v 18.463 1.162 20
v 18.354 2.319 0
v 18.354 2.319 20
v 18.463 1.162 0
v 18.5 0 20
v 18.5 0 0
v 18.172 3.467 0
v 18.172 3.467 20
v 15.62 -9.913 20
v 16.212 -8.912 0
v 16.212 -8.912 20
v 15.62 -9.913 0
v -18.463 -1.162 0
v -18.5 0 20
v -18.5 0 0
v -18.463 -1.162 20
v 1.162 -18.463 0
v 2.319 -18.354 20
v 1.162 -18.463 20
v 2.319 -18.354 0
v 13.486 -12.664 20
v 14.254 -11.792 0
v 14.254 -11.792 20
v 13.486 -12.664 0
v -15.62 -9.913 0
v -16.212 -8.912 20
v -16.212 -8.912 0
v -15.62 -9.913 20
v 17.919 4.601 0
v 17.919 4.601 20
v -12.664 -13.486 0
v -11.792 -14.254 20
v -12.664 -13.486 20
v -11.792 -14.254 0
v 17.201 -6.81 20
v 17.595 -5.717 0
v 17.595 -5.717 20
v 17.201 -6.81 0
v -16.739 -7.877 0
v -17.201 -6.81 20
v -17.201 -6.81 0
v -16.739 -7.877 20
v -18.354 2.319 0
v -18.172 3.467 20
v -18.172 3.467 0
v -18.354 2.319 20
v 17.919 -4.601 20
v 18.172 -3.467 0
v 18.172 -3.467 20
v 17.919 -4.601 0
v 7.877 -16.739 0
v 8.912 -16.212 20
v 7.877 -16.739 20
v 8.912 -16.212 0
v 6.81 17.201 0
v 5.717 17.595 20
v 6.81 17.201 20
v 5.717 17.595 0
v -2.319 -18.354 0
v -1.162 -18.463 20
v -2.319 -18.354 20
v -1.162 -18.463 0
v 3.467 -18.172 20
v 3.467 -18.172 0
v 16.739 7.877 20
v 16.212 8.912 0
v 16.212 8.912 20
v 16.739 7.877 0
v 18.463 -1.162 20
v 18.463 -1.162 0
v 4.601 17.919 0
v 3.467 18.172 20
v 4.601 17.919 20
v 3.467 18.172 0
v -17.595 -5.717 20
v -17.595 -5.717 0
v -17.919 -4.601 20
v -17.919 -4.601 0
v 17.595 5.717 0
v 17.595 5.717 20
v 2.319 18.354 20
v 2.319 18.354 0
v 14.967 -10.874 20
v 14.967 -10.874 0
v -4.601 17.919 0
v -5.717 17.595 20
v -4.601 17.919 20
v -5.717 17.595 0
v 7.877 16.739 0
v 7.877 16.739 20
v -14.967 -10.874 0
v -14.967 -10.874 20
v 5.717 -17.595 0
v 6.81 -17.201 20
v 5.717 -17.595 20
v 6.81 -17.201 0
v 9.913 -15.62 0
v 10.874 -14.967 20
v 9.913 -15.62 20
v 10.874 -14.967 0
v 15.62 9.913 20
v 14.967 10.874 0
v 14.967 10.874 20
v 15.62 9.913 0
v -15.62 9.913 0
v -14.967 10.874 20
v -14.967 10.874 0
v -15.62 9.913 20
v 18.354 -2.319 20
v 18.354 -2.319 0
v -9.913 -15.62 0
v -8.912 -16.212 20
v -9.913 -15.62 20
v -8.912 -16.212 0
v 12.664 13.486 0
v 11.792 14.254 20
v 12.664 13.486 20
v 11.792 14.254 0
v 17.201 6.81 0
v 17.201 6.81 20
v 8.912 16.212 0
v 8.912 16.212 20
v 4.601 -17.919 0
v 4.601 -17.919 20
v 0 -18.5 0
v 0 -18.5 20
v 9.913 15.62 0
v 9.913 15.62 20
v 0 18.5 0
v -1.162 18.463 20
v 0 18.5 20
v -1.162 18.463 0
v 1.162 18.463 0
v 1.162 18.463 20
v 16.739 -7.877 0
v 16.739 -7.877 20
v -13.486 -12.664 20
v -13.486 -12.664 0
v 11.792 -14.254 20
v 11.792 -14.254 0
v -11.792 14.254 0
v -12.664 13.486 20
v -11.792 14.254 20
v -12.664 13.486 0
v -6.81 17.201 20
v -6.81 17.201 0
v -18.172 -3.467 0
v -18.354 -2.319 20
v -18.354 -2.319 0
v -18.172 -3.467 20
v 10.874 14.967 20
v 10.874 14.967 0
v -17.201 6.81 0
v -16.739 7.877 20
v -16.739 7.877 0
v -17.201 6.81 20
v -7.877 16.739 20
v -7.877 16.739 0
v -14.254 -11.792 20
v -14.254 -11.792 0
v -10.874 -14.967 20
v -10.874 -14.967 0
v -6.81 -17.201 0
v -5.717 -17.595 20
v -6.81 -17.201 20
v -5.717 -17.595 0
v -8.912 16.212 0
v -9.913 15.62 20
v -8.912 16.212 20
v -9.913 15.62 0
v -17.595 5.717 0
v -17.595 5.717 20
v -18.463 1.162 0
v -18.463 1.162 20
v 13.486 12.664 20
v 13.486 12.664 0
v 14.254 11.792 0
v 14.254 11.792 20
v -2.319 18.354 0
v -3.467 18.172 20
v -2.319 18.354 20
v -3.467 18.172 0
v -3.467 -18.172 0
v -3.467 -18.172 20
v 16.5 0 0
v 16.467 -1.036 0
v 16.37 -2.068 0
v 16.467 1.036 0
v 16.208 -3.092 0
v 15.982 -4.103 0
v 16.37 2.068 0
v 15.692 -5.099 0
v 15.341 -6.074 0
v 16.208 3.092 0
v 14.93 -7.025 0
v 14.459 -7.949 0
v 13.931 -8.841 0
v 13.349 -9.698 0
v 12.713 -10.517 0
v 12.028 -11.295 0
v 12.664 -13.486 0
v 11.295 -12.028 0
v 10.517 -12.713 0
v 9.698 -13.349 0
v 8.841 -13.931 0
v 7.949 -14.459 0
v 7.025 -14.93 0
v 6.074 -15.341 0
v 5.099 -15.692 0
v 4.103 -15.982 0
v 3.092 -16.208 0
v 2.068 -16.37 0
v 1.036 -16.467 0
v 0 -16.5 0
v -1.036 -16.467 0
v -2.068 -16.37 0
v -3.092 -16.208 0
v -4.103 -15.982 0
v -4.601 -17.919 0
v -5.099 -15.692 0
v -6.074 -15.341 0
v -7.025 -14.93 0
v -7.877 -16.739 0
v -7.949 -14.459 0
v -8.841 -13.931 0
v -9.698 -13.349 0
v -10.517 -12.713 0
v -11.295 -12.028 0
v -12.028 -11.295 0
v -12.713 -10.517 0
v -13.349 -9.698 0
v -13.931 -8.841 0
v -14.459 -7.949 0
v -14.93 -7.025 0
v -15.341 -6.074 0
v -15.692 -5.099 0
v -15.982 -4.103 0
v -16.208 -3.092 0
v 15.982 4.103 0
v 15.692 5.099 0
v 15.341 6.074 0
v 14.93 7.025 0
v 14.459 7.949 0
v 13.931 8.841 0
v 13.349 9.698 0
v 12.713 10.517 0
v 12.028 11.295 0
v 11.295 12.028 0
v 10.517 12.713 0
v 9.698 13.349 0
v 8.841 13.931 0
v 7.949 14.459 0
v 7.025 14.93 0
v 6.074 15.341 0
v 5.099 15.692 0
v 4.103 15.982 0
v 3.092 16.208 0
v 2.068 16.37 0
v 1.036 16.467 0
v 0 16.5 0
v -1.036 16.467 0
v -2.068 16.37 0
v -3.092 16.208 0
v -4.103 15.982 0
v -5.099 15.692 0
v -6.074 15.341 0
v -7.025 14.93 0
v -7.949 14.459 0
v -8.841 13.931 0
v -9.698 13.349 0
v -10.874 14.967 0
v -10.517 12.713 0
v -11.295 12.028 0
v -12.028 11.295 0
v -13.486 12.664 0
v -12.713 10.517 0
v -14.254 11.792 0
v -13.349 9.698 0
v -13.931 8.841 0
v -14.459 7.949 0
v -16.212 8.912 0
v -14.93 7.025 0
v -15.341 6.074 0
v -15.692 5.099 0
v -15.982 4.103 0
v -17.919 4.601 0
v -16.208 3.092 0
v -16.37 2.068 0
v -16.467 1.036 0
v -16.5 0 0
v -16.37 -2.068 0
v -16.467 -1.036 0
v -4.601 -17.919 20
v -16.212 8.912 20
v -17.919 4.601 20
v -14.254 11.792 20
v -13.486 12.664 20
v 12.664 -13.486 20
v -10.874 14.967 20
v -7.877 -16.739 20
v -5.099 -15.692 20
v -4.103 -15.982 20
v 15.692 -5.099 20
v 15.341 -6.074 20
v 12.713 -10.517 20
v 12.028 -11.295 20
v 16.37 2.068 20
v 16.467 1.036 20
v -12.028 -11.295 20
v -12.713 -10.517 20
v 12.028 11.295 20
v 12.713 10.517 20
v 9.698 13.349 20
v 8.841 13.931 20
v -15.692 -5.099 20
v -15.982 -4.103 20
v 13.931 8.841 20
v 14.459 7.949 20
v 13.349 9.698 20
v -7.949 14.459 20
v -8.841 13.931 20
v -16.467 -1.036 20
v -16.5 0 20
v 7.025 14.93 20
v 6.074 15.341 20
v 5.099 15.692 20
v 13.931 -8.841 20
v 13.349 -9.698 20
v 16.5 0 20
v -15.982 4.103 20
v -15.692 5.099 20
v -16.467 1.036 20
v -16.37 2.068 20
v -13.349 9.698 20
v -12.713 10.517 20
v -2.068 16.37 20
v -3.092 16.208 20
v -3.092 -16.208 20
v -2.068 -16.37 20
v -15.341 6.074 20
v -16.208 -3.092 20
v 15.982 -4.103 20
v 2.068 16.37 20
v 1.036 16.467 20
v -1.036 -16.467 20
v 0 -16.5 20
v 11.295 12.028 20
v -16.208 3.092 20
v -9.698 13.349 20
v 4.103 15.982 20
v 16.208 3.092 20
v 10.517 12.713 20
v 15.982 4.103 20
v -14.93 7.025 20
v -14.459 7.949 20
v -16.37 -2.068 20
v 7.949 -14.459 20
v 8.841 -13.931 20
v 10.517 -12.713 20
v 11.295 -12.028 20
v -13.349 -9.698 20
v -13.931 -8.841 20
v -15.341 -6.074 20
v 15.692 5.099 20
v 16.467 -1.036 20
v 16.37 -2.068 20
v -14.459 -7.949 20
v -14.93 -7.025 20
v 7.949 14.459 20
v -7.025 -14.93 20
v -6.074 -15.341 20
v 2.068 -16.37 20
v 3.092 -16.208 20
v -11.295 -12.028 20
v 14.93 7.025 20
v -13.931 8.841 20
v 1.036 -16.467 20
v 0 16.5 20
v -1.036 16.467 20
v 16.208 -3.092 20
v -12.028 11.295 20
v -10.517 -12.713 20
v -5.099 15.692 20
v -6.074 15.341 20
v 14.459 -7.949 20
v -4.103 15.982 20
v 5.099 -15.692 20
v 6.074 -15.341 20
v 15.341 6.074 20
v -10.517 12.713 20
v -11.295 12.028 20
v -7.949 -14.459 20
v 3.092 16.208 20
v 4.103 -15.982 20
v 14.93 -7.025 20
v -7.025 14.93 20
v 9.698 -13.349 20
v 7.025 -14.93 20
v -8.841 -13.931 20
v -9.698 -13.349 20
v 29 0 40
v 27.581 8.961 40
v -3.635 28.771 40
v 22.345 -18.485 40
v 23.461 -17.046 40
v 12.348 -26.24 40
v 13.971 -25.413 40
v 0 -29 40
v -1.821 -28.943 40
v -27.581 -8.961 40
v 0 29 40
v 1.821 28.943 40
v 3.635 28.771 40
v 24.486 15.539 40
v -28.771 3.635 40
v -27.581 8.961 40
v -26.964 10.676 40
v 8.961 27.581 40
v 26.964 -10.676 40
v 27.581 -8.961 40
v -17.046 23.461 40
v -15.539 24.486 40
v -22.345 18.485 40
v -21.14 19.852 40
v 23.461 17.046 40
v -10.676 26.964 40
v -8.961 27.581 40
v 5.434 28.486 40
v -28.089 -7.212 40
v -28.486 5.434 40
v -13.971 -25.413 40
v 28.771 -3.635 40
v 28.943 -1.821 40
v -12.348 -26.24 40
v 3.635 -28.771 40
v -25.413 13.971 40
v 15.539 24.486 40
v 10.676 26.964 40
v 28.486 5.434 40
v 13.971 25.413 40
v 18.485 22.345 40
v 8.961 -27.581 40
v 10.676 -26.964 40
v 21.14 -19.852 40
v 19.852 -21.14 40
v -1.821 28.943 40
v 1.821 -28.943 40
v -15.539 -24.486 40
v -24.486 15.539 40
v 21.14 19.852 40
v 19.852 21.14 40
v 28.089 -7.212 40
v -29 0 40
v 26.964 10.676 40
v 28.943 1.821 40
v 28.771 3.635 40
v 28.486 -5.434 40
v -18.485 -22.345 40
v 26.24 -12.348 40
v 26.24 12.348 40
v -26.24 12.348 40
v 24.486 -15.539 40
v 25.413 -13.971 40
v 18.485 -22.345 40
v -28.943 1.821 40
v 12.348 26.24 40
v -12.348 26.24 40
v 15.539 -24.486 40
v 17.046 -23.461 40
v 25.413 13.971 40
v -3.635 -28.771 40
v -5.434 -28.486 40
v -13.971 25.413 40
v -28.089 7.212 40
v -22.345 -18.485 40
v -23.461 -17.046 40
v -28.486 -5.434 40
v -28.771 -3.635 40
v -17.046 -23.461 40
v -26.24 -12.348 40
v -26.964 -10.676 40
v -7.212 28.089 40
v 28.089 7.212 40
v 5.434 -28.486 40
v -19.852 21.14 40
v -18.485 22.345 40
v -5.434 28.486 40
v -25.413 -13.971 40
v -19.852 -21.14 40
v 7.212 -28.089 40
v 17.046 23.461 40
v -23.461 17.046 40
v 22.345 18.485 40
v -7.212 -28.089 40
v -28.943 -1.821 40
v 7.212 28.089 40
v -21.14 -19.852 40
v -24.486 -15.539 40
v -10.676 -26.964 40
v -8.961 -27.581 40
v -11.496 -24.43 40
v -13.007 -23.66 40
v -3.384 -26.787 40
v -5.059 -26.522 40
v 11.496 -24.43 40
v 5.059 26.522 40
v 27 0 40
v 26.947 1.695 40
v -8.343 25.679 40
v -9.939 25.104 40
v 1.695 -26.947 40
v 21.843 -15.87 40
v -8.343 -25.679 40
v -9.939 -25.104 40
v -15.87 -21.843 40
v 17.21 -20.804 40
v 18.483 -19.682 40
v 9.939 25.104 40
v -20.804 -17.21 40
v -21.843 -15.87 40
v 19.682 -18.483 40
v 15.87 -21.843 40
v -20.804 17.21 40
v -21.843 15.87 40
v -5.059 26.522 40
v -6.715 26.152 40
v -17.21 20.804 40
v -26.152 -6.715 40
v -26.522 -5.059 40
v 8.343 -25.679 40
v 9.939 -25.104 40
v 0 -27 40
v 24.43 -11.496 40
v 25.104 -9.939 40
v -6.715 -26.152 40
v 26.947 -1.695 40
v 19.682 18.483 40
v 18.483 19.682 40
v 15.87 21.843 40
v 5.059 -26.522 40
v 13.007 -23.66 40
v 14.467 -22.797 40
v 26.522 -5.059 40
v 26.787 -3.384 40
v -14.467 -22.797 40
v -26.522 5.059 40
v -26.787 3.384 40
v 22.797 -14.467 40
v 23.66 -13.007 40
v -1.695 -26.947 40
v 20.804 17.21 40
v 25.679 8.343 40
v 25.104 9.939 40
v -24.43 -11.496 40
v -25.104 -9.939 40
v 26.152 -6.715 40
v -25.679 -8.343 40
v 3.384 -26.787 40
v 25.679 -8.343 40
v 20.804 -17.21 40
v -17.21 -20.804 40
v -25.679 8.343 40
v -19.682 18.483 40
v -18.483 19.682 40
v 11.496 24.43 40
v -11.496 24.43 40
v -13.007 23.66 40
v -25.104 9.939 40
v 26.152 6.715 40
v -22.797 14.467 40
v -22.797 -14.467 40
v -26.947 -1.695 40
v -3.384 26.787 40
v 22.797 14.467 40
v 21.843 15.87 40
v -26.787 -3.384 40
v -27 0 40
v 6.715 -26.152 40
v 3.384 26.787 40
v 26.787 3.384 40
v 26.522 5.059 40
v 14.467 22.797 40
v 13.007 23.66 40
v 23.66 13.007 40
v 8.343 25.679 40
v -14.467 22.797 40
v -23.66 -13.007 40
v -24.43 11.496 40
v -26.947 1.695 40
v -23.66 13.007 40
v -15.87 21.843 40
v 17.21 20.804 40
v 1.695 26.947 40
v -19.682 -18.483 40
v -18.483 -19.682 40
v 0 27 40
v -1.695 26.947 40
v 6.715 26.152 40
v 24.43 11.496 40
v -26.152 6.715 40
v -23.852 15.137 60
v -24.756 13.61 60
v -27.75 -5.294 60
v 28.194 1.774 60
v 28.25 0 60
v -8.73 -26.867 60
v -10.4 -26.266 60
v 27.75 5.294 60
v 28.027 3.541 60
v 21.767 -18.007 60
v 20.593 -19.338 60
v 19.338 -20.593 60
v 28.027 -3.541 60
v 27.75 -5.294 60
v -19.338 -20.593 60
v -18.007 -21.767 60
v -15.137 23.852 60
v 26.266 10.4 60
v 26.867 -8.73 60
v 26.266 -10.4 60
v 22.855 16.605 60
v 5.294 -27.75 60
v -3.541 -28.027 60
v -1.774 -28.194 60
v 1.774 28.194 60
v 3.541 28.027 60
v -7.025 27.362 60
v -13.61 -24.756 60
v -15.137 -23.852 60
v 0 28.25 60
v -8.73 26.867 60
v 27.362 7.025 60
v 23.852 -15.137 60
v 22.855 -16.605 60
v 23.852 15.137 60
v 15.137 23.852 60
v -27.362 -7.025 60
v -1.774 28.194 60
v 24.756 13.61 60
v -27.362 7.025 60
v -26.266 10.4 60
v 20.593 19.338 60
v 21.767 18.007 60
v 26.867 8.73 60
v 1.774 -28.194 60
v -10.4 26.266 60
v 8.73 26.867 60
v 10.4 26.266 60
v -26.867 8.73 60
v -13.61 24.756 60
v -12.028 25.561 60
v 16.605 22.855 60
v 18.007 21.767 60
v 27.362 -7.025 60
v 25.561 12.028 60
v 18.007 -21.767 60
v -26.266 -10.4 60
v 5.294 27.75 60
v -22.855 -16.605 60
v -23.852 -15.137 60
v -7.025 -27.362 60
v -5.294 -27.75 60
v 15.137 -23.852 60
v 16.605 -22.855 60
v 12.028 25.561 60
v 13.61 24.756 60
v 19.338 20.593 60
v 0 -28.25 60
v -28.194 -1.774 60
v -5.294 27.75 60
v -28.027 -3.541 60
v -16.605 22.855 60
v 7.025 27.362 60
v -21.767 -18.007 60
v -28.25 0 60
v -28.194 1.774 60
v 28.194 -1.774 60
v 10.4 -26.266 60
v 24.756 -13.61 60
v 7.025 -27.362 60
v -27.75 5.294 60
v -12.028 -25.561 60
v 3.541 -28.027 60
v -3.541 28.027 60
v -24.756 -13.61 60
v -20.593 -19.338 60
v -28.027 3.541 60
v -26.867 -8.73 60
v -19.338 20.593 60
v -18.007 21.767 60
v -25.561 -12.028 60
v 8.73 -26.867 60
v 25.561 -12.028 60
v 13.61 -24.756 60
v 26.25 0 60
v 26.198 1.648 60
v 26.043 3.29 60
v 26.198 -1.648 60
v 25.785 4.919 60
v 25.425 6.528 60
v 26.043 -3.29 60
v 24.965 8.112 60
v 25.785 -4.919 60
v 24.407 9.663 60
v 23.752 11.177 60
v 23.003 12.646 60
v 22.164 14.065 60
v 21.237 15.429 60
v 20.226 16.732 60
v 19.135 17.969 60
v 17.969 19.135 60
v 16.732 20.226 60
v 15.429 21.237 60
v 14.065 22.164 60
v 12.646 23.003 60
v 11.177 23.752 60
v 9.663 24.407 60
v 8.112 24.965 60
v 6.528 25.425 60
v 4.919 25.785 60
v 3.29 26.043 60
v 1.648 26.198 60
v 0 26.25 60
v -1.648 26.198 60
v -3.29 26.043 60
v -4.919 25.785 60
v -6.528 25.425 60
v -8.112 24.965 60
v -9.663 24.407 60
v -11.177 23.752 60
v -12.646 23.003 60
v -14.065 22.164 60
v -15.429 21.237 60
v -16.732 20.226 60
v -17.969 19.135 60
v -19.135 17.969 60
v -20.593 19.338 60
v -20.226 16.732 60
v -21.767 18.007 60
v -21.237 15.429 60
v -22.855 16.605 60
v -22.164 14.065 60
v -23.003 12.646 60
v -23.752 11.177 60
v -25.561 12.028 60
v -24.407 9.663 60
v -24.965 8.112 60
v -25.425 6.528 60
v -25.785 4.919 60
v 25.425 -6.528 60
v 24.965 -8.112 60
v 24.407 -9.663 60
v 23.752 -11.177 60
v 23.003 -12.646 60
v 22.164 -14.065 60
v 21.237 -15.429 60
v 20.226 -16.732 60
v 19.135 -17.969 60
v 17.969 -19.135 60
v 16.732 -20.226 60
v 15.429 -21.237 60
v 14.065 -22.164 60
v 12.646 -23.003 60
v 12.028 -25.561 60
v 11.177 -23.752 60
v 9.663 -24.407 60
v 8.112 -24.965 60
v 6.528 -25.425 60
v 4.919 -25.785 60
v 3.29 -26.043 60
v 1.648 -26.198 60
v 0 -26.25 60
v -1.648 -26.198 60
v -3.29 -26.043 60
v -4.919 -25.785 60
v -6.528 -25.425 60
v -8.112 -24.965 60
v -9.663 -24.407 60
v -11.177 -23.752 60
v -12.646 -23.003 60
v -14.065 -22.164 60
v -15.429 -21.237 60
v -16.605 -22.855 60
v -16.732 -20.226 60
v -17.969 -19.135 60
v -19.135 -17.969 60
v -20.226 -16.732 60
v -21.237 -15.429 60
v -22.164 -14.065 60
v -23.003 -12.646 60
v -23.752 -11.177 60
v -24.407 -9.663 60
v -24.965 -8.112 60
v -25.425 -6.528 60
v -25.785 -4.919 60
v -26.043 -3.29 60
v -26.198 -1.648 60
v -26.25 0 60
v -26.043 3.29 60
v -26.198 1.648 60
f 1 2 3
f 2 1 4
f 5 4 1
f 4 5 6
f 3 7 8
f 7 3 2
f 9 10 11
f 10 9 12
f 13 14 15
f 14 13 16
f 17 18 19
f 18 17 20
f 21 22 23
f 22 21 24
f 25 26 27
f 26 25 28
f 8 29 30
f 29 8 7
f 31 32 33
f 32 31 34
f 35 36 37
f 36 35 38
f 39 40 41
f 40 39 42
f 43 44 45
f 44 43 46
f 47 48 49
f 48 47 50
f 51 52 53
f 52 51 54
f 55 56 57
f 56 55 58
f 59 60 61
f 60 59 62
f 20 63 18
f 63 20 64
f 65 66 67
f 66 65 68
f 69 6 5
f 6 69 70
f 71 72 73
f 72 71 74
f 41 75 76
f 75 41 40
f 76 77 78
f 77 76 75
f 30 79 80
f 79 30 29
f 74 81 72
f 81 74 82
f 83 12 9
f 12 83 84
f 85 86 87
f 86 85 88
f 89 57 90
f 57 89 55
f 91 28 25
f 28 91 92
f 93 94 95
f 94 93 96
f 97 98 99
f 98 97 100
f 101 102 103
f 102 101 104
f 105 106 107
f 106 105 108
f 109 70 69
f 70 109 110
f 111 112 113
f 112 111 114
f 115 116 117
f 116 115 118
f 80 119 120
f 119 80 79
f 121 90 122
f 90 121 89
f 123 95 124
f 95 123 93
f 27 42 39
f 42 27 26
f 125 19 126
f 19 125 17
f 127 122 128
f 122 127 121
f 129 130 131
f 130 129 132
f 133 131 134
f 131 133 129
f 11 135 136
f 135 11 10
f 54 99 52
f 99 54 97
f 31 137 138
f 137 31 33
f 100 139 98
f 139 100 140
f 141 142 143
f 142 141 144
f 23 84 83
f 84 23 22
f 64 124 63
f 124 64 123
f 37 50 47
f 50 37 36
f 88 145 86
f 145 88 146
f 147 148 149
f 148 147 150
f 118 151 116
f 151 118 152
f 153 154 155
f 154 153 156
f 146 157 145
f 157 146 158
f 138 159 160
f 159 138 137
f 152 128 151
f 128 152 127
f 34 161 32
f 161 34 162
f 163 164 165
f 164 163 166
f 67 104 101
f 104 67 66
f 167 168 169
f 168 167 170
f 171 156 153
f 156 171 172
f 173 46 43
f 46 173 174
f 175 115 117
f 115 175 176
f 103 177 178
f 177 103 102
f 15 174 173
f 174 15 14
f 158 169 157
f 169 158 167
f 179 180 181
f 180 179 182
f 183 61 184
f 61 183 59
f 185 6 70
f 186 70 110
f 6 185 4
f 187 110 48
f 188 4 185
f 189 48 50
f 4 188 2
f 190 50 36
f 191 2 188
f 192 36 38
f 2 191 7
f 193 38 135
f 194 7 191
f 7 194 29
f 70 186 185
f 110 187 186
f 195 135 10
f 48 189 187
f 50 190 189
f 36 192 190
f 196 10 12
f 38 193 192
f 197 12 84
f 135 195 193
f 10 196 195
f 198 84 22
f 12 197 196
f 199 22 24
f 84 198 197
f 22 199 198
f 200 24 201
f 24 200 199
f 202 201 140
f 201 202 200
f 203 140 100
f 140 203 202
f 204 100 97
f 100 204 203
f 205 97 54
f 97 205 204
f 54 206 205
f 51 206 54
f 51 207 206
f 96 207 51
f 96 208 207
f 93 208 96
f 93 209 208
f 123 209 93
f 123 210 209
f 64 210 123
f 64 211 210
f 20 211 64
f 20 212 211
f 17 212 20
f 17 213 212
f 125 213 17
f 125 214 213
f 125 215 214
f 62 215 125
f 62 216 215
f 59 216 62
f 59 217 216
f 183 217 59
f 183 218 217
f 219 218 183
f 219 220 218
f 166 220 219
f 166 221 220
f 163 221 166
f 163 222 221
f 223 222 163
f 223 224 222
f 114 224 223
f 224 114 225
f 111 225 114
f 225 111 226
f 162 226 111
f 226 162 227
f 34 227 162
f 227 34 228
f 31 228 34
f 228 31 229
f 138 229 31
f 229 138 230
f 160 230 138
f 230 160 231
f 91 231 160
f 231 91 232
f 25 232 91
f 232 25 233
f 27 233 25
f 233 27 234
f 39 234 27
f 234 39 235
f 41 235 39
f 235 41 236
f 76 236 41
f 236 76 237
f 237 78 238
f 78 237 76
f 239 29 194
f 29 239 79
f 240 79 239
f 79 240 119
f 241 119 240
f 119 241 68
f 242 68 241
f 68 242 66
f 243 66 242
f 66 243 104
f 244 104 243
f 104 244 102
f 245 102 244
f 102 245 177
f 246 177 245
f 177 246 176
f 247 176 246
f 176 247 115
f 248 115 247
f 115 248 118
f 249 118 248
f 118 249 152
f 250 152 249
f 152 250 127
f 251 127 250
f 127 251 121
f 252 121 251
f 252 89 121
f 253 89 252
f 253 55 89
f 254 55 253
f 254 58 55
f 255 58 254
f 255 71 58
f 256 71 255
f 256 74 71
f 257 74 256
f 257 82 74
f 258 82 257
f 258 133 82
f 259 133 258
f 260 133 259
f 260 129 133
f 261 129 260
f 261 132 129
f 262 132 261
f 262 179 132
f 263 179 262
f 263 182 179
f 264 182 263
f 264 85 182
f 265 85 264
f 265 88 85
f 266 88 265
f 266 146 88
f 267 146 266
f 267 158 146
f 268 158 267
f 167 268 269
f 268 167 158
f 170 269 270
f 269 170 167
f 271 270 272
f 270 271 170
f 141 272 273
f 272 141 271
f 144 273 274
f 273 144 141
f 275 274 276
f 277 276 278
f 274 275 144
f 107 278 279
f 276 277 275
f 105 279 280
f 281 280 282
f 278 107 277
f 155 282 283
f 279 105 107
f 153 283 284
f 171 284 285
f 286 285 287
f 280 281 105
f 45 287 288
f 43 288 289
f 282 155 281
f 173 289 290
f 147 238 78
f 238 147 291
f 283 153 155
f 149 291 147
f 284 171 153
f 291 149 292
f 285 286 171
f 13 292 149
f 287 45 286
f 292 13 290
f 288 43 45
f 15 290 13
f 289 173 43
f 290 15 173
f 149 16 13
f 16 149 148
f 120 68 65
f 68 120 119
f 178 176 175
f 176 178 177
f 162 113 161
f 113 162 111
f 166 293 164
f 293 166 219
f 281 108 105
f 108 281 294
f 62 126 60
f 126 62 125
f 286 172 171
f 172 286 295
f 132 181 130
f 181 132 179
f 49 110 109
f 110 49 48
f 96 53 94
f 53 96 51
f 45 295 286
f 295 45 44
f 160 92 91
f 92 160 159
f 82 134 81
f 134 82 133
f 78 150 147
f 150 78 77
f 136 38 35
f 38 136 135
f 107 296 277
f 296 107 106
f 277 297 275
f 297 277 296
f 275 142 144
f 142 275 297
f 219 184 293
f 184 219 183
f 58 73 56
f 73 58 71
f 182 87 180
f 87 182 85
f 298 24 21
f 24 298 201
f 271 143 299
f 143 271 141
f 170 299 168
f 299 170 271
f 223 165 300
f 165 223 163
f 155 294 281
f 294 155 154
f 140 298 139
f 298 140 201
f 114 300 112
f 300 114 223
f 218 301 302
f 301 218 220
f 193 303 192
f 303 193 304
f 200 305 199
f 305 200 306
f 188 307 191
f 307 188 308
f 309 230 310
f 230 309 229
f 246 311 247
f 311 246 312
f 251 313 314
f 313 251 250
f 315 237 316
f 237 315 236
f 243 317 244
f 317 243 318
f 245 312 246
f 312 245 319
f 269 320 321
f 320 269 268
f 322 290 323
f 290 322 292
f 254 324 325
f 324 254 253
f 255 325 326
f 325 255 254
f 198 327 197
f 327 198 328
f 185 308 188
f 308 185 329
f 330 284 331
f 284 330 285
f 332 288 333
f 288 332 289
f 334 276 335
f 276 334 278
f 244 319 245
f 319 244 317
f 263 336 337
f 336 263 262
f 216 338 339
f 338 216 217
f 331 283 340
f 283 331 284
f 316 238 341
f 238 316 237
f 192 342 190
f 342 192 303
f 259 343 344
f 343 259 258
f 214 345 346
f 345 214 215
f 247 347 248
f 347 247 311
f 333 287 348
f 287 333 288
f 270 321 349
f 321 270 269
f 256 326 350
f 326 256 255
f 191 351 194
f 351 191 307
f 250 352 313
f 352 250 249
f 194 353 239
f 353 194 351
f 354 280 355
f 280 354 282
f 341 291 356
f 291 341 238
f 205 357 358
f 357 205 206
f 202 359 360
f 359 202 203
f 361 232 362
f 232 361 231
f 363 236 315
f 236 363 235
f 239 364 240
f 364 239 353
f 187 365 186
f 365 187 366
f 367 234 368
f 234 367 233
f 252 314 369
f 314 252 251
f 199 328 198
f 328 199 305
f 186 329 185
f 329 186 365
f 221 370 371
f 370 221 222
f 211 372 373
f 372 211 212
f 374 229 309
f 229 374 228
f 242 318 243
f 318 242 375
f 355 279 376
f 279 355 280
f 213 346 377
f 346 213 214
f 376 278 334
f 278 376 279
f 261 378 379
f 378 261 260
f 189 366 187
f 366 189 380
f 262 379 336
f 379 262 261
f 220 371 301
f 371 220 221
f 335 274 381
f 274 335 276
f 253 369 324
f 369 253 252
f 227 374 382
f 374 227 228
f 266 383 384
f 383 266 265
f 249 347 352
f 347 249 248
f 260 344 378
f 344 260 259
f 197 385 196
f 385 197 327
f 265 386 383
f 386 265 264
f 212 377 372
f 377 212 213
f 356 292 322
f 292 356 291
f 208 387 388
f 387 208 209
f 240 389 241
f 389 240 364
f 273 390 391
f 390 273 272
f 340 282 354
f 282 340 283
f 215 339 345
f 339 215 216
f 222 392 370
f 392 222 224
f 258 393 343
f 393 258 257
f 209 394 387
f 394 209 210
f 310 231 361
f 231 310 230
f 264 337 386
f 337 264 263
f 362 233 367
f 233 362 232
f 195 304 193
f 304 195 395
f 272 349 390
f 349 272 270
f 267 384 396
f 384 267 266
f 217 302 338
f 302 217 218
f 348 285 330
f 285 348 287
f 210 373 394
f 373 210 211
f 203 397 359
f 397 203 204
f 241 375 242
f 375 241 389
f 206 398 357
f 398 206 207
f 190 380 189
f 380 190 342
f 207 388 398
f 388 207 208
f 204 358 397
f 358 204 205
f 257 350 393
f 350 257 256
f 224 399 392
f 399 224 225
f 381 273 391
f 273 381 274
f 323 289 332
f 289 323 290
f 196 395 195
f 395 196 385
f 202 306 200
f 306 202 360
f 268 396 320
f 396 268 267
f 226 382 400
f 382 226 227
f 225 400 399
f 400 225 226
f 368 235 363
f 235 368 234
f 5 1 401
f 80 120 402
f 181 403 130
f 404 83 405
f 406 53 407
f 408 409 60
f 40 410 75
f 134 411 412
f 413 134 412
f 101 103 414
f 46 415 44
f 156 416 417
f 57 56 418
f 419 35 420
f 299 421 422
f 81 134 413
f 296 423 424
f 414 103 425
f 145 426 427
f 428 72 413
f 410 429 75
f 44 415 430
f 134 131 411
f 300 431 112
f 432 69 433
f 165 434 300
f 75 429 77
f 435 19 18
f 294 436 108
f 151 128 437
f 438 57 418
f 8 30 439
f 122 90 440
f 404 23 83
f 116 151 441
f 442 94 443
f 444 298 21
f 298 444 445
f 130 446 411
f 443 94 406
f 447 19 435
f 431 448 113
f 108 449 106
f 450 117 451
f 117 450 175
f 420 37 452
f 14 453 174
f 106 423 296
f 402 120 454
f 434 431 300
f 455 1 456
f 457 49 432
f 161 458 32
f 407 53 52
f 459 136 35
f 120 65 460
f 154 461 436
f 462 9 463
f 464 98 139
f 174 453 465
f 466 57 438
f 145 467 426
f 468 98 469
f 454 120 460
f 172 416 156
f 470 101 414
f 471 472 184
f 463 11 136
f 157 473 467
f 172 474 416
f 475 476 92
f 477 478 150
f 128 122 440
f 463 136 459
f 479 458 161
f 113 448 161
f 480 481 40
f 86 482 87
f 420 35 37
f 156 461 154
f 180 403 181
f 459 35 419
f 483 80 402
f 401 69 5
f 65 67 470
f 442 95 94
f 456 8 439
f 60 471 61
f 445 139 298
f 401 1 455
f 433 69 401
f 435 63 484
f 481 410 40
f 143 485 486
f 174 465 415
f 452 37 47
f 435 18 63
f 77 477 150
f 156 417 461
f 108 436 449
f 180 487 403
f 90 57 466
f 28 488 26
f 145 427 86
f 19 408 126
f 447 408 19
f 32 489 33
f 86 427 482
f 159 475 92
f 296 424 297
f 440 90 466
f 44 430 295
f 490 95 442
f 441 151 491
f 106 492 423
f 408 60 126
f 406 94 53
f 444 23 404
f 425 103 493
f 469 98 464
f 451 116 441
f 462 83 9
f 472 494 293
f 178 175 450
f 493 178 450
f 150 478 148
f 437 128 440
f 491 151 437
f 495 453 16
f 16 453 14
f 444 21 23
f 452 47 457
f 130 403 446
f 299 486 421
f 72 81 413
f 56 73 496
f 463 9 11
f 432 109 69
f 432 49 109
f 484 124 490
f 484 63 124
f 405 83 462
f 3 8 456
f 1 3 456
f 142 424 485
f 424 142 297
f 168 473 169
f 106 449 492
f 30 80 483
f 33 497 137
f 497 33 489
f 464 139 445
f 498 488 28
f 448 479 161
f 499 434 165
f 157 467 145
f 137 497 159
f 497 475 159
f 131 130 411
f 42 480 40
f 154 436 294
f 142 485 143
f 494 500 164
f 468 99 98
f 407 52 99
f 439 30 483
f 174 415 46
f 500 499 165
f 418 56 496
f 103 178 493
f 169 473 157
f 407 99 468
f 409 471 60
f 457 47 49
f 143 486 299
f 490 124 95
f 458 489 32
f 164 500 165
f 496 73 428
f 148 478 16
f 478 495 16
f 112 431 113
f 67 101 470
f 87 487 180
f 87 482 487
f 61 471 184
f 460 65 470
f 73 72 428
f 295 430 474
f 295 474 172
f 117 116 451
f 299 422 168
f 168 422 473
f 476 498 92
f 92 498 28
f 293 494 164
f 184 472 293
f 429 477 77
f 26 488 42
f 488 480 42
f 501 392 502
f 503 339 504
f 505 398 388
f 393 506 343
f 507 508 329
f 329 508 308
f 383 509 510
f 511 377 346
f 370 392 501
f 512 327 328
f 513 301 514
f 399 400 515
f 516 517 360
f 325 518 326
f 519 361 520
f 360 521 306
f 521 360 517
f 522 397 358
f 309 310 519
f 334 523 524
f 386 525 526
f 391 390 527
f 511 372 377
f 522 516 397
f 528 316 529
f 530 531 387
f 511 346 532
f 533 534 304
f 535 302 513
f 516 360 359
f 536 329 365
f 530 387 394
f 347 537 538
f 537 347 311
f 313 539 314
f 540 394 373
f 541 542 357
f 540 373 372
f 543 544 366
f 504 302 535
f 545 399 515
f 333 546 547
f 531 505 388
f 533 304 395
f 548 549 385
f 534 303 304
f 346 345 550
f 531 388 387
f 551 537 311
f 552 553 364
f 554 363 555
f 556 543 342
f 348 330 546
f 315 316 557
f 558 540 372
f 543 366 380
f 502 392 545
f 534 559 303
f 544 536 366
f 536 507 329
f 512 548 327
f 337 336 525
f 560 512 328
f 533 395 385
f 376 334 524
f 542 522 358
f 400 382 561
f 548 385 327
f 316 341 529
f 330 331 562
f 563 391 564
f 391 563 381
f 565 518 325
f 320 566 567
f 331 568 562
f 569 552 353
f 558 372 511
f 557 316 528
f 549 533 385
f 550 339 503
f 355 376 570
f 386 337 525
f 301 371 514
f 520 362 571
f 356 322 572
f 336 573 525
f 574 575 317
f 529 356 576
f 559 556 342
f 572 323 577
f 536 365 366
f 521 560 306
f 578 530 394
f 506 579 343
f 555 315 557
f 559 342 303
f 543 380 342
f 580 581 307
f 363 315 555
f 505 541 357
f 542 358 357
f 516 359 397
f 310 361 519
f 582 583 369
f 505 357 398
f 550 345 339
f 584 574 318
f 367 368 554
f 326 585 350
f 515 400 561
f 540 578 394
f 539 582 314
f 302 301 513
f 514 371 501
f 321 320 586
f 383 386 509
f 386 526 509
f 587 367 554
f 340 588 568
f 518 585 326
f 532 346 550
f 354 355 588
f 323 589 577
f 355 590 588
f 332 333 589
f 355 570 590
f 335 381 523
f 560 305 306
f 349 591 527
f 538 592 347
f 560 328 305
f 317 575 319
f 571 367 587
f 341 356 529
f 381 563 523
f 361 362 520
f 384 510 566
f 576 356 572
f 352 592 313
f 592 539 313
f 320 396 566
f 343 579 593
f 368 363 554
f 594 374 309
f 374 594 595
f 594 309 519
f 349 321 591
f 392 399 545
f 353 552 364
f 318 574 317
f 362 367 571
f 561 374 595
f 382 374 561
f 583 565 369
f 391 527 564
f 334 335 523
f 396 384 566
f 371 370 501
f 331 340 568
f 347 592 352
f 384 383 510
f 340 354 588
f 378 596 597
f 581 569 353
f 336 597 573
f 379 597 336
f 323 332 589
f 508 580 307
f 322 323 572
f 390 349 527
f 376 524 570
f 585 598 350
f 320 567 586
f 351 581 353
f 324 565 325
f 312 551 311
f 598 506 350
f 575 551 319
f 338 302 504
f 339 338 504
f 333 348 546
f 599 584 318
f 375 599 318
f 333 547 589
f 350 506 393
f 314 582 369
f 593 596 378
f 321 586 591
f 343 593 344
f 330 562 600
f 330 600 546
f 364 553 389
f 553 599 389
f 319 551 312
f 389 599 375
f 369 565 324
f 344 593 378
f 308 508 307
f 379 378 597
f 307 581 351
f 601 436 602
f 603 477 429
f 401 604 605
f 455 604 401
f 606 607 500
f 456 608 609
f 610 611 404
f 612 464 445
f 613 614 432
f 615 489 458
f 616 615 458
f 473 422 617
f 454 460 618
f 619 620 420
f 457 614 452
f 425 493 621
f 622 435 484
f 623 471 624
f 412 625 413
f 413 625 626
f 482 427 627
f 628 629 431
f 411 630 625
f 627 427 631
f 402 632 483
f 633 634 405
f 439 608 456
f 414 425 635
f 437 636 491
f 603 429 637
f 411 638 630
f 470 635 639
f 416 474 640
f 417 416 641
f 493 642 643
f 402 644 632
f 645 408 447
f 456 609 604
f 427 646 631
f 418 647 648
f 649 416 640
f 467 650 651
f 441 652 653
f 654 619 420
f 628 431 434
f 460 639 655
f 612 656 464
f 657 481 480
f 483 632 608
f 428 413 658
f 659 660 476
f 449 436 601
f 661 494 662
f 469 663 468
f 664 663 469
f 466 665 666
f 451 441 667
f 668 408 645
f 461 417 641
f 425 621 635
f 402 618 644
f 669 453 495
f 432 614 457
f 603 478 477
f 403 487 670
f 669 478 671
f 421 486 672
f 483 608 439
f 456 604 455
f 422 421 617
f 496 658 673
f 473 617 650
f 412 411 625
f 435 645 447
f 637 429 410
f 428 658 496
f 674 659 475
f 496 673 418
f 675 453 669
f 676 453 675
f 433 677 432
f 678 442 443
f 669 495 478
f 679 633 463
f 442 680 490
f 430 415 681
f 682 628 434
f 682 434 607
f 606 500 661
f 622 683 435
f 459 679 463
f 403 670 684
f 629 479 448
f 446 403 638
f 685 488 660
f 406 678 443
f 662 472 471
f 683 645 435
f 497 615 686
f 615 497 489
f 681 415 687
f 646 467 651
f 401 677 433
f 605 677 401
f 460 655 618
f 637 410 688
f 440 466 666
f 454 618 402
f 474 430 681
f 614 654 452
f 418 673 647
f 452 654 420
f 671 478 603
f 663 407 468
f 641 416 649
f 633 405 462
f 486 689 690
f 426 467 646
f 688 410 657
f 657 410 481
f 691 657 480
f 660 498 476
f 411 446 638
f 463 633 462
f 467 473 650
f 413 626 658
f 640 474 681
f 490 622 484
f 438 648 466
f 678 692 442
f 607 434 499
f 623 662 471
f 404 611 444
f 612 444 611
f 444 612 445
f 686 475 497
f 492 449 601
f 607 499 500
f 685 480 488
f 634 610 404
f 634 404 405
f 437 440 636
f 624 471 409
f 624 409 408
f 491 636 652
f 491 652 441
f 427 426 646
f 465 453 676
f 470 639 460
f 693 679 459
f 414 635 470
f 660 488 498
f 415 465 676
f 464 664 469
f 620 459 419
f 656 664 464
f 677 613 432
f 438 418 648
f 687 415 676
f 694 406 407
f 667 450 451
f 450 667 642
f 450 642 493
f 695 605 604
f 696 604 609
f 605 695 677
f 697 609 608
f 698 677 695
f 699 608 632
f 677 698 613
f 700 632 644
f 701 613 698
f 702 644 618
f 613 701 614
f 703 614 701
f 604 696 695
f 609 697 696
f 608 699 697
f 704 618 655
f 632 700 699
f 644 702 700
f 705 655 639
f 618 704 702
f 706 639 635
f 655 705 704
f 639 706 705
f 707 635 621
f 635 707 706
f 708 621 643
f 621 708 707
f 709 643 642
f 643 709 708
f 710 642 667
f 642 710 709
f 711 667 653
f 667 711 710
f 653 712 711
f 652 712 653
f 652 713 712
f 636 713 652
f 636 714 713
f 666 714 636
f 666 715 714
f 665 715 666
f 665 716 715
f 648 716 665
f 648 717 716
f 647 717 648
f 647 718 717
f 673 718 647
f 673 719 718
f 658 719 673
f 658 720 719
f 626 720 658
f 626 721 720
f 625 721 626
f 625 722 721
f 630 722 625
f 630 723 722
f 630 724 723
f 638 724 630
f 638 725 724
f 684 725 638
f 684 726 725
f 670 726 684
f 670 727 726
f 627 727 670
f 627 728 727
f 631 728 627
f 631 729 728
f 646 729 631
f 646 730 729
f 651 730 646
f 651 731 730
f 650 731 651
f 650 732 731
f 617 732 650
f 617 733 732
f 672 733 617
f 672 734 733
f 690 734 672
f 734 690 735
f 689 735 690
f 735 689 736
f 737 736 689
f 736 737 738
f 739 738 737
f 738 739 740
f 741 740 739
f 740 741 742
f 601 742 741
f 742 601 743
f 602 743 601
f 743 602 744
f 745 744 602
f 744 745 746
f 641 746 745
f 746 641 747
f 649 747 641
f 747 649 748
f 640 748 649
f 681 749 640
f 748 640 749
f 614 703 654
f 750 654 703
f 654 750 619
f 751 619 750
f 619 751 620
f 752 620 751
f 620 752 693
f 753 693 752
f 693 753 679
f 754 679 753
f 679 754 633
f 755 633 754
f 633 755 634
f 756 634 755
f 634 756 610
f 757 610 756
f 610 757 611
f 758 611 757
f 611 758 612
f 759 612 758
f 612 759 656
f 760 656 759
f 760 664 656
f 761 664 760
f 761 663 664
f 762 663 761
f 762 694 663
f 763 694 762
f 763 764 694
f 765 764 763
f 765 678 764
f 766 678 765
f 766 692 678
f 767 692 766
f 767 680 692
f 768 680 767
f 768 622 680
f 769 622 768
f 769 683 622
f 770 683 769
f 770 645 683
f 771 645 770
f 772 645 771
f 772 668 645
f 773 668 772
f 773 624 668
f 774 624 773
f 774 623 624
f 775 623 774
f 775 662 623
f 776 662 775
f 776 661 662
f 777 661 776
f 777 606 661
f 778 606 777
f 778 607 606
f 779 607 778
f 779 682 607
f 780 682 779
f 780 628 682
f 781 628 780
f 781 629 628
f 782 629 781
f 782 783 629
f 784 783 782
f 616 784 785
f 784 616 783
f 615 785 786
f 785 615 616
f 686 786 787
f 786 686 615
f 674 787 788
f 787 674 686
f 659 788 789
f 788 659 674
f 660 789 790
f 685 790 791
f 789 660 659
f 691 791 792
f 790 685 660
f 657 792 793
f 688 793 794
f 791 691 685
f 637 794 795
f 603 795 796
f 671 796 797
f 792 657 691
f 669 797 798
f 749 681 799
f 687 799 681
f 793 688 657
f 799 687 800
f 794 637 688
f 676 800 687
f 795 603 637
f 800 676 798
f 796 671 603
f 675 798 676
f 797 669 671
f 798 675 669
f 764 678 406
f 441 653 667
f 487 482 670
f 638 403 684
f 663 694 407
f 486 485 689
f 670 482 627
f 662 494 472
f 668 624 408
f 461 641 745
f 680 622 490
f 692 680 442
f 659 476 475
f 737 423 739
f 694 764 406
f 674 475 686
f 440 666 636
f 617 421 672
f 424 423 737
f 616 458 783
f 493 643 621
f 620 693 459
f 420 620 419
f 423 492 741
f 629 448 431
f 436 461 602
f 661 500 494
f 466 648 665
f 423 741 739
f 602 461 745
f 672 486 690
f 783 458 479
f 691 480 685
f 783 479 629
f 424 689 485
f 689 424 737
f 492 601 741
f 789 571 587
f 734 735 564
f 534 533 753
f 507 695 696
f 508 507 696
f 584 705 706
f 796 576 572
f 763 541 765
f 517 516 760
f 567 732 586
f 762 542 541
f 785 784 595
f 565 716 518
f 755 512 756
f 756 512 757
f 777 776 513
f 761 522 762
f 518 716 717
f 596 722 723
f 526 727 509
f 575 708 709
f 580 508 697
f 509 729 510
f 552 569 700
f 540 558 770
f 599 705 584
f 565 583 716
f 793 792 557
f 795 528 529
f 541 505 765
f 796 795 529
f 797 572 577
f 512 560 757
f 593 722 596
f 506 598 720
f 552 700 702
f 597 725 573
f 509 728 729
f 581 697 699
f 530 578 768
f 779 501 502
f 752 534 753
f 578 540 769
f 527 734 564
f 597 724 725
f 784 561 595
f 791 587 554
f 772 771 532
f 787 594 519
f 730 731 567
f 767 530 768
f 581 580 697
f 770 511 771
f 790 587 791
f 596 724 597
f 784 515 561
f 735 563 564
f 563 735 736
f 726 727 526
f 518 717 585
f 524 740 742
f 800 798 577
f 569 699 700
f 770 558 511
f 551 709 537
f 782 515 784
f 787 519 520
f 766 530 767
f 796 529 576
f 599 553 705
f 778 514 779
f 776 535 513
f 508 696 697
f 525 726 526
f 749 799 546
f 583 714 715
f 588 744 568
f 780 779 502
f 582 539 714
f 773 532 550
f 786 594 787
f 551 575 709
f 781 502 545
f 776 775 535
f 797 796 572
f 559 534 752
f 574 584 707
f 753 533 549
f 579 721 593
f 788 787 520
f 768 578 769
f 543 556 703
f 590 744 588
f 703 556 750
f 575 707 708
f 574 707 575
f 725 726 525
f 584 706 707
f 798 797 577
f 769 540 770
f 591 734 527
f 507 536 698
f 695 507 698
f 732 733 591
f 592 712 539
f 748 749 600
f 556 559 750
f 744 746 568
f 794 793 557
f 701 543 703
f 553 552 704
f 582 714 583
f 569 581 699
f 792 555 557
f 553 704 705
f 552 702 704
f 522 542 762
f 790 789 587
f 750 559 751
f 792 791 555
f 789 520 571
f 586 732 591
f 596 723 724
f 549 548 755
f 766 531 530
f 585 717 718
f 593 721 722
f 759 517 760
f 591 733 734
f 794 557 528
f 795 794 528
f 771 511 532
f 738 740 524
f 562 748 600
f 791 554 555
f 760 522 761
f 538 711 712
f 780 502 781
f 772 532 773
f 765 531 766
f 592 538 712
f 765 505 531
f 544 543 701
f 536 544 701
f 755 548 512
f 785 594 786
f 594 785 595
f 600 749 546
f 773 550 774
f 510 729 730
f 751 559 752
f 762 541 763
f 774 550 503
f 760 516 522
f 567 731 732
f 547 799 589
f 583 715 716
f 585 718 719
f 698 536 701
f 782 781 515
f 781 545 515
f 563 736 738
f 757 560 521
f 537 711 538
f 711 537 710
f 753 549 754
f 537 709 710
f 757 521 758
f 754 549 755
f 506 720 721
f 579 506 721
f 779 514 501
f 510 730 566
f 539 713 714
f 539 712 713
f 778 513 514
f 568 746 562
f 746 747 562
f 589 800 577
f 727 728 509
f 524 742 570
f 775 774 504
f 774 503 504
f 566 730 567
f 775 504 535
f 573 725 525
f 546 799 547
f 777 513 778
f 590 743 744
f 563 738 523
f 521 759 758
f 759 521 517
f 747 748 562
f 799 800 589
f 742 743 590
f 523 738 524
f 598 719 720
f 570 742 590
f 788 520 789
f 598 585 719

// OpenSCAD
// !! taper end

$fn=100;
wall_thickness = 2;
section_length = 20;
end_taper = 1.5;

start_int_dia = 33;
start_ext_dia = start_int_dia + 2 * wall_thickness;
end_ext_dia = 58;
end_int_dia = end_ext_dia - 2 * wall_thickness;


module start_tube() {
    difference() {
        cylinder(section_length, d = start_ext_dia);
        cylinder(section_length, d = start_int_dia);
    }
}

module middle_tube() {
    difference() {
        cylinder(section_length, d1 = start_ext_dia, d2 = end_ext_dia);
        cylinder(section_length, d1 = start_int_dia, d2 = end_int_dia);
    }
}

module end_tube() {
    difference() {
        cylinder(section_length, d1 = end_ext_dia, d2 = end_ext_dia-end_taper);
        cylinder(section_length, d = end_int_dia, d2 = end_int_dia-end_taper);
    }
}

module adaptor() {
    start_tube();
    translate([0, 0, section_length]) middle_tube();
    translate([0, 0, section_length*2]) end_tube();    
}


adaptor();
    
    
